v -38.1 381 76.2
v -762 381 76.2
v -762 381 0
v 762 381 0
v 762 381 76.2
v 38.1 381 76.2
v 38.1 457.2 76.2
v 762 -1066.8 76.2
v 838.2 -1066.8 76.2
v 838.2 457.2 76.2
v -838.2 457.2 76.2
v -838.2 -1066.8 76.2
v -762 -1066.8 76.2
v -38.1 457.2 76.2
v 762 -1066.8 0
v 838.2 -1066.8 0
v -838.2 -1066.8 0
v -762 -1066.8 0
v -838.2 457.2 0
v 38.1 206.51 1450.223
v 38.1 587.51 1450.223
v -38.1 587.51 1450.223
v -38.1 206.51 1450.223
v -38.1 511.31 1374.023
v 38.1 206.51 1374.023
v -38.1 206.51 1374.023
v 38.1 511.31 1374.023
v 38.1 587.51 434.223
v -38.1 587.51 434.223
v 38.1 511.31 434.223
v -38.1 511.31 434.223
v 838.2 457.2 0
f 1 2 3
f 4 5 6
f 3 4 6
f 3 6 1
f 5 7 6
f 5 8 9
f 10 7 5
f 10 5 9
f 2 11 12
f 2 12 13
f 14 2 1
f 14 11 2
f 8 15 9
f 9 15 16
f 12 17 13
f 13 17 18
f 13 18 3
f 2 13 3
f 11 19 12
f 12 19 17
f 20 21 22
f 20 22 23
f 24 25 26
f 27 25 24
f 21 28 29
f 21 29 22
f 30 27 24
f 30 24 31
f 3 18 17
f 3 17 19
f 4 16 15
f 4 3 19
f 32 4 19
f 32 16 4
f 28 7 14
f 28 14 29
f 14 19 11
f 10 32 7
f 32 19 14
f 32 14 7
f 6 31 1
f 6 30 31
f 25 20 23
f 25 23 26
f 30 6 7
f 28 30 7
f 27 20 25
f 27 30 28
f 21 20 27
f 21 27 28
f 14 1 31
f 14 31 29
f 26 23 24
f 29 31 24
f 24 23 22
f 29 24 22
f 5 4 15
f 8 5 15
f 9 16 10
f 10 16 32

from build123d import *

# Parameters (mm, degrees)
F1_DEPTH = 76.2
F3_DEPTH = 38.1


with BuildPart() as f1:
    # F0 (on Top) → F1 (new body)
    with BuildSketch(Plane.XY):
        Polygon((-838.2, 457.2), (-838.2, -1066.8), (-762, -1066.8), (-762, 381), (762, 381), (762, -1066.8), (838.2, -1066.8), (838.2, 457.2), align=None)
    extrude(amount=F1_DEPTH)

    # F2 (on Right) → F3 (join, symmetric)
    with BuildSketch(Plane.YZ):
        Polygon((381, 0), (457.2, 0), (457.2, 76.2), (587.509675, 434.222889), (587.509675, 1450.222889), (206.509675, 1450.222889), (206.509675, 1374.022889), (511.309675, 1374.022889), (511.309675, 434.222889), (381, 76.2), align=None)
    extrude(amount=F3_DEPTH, both=True)


solid = f1.part
